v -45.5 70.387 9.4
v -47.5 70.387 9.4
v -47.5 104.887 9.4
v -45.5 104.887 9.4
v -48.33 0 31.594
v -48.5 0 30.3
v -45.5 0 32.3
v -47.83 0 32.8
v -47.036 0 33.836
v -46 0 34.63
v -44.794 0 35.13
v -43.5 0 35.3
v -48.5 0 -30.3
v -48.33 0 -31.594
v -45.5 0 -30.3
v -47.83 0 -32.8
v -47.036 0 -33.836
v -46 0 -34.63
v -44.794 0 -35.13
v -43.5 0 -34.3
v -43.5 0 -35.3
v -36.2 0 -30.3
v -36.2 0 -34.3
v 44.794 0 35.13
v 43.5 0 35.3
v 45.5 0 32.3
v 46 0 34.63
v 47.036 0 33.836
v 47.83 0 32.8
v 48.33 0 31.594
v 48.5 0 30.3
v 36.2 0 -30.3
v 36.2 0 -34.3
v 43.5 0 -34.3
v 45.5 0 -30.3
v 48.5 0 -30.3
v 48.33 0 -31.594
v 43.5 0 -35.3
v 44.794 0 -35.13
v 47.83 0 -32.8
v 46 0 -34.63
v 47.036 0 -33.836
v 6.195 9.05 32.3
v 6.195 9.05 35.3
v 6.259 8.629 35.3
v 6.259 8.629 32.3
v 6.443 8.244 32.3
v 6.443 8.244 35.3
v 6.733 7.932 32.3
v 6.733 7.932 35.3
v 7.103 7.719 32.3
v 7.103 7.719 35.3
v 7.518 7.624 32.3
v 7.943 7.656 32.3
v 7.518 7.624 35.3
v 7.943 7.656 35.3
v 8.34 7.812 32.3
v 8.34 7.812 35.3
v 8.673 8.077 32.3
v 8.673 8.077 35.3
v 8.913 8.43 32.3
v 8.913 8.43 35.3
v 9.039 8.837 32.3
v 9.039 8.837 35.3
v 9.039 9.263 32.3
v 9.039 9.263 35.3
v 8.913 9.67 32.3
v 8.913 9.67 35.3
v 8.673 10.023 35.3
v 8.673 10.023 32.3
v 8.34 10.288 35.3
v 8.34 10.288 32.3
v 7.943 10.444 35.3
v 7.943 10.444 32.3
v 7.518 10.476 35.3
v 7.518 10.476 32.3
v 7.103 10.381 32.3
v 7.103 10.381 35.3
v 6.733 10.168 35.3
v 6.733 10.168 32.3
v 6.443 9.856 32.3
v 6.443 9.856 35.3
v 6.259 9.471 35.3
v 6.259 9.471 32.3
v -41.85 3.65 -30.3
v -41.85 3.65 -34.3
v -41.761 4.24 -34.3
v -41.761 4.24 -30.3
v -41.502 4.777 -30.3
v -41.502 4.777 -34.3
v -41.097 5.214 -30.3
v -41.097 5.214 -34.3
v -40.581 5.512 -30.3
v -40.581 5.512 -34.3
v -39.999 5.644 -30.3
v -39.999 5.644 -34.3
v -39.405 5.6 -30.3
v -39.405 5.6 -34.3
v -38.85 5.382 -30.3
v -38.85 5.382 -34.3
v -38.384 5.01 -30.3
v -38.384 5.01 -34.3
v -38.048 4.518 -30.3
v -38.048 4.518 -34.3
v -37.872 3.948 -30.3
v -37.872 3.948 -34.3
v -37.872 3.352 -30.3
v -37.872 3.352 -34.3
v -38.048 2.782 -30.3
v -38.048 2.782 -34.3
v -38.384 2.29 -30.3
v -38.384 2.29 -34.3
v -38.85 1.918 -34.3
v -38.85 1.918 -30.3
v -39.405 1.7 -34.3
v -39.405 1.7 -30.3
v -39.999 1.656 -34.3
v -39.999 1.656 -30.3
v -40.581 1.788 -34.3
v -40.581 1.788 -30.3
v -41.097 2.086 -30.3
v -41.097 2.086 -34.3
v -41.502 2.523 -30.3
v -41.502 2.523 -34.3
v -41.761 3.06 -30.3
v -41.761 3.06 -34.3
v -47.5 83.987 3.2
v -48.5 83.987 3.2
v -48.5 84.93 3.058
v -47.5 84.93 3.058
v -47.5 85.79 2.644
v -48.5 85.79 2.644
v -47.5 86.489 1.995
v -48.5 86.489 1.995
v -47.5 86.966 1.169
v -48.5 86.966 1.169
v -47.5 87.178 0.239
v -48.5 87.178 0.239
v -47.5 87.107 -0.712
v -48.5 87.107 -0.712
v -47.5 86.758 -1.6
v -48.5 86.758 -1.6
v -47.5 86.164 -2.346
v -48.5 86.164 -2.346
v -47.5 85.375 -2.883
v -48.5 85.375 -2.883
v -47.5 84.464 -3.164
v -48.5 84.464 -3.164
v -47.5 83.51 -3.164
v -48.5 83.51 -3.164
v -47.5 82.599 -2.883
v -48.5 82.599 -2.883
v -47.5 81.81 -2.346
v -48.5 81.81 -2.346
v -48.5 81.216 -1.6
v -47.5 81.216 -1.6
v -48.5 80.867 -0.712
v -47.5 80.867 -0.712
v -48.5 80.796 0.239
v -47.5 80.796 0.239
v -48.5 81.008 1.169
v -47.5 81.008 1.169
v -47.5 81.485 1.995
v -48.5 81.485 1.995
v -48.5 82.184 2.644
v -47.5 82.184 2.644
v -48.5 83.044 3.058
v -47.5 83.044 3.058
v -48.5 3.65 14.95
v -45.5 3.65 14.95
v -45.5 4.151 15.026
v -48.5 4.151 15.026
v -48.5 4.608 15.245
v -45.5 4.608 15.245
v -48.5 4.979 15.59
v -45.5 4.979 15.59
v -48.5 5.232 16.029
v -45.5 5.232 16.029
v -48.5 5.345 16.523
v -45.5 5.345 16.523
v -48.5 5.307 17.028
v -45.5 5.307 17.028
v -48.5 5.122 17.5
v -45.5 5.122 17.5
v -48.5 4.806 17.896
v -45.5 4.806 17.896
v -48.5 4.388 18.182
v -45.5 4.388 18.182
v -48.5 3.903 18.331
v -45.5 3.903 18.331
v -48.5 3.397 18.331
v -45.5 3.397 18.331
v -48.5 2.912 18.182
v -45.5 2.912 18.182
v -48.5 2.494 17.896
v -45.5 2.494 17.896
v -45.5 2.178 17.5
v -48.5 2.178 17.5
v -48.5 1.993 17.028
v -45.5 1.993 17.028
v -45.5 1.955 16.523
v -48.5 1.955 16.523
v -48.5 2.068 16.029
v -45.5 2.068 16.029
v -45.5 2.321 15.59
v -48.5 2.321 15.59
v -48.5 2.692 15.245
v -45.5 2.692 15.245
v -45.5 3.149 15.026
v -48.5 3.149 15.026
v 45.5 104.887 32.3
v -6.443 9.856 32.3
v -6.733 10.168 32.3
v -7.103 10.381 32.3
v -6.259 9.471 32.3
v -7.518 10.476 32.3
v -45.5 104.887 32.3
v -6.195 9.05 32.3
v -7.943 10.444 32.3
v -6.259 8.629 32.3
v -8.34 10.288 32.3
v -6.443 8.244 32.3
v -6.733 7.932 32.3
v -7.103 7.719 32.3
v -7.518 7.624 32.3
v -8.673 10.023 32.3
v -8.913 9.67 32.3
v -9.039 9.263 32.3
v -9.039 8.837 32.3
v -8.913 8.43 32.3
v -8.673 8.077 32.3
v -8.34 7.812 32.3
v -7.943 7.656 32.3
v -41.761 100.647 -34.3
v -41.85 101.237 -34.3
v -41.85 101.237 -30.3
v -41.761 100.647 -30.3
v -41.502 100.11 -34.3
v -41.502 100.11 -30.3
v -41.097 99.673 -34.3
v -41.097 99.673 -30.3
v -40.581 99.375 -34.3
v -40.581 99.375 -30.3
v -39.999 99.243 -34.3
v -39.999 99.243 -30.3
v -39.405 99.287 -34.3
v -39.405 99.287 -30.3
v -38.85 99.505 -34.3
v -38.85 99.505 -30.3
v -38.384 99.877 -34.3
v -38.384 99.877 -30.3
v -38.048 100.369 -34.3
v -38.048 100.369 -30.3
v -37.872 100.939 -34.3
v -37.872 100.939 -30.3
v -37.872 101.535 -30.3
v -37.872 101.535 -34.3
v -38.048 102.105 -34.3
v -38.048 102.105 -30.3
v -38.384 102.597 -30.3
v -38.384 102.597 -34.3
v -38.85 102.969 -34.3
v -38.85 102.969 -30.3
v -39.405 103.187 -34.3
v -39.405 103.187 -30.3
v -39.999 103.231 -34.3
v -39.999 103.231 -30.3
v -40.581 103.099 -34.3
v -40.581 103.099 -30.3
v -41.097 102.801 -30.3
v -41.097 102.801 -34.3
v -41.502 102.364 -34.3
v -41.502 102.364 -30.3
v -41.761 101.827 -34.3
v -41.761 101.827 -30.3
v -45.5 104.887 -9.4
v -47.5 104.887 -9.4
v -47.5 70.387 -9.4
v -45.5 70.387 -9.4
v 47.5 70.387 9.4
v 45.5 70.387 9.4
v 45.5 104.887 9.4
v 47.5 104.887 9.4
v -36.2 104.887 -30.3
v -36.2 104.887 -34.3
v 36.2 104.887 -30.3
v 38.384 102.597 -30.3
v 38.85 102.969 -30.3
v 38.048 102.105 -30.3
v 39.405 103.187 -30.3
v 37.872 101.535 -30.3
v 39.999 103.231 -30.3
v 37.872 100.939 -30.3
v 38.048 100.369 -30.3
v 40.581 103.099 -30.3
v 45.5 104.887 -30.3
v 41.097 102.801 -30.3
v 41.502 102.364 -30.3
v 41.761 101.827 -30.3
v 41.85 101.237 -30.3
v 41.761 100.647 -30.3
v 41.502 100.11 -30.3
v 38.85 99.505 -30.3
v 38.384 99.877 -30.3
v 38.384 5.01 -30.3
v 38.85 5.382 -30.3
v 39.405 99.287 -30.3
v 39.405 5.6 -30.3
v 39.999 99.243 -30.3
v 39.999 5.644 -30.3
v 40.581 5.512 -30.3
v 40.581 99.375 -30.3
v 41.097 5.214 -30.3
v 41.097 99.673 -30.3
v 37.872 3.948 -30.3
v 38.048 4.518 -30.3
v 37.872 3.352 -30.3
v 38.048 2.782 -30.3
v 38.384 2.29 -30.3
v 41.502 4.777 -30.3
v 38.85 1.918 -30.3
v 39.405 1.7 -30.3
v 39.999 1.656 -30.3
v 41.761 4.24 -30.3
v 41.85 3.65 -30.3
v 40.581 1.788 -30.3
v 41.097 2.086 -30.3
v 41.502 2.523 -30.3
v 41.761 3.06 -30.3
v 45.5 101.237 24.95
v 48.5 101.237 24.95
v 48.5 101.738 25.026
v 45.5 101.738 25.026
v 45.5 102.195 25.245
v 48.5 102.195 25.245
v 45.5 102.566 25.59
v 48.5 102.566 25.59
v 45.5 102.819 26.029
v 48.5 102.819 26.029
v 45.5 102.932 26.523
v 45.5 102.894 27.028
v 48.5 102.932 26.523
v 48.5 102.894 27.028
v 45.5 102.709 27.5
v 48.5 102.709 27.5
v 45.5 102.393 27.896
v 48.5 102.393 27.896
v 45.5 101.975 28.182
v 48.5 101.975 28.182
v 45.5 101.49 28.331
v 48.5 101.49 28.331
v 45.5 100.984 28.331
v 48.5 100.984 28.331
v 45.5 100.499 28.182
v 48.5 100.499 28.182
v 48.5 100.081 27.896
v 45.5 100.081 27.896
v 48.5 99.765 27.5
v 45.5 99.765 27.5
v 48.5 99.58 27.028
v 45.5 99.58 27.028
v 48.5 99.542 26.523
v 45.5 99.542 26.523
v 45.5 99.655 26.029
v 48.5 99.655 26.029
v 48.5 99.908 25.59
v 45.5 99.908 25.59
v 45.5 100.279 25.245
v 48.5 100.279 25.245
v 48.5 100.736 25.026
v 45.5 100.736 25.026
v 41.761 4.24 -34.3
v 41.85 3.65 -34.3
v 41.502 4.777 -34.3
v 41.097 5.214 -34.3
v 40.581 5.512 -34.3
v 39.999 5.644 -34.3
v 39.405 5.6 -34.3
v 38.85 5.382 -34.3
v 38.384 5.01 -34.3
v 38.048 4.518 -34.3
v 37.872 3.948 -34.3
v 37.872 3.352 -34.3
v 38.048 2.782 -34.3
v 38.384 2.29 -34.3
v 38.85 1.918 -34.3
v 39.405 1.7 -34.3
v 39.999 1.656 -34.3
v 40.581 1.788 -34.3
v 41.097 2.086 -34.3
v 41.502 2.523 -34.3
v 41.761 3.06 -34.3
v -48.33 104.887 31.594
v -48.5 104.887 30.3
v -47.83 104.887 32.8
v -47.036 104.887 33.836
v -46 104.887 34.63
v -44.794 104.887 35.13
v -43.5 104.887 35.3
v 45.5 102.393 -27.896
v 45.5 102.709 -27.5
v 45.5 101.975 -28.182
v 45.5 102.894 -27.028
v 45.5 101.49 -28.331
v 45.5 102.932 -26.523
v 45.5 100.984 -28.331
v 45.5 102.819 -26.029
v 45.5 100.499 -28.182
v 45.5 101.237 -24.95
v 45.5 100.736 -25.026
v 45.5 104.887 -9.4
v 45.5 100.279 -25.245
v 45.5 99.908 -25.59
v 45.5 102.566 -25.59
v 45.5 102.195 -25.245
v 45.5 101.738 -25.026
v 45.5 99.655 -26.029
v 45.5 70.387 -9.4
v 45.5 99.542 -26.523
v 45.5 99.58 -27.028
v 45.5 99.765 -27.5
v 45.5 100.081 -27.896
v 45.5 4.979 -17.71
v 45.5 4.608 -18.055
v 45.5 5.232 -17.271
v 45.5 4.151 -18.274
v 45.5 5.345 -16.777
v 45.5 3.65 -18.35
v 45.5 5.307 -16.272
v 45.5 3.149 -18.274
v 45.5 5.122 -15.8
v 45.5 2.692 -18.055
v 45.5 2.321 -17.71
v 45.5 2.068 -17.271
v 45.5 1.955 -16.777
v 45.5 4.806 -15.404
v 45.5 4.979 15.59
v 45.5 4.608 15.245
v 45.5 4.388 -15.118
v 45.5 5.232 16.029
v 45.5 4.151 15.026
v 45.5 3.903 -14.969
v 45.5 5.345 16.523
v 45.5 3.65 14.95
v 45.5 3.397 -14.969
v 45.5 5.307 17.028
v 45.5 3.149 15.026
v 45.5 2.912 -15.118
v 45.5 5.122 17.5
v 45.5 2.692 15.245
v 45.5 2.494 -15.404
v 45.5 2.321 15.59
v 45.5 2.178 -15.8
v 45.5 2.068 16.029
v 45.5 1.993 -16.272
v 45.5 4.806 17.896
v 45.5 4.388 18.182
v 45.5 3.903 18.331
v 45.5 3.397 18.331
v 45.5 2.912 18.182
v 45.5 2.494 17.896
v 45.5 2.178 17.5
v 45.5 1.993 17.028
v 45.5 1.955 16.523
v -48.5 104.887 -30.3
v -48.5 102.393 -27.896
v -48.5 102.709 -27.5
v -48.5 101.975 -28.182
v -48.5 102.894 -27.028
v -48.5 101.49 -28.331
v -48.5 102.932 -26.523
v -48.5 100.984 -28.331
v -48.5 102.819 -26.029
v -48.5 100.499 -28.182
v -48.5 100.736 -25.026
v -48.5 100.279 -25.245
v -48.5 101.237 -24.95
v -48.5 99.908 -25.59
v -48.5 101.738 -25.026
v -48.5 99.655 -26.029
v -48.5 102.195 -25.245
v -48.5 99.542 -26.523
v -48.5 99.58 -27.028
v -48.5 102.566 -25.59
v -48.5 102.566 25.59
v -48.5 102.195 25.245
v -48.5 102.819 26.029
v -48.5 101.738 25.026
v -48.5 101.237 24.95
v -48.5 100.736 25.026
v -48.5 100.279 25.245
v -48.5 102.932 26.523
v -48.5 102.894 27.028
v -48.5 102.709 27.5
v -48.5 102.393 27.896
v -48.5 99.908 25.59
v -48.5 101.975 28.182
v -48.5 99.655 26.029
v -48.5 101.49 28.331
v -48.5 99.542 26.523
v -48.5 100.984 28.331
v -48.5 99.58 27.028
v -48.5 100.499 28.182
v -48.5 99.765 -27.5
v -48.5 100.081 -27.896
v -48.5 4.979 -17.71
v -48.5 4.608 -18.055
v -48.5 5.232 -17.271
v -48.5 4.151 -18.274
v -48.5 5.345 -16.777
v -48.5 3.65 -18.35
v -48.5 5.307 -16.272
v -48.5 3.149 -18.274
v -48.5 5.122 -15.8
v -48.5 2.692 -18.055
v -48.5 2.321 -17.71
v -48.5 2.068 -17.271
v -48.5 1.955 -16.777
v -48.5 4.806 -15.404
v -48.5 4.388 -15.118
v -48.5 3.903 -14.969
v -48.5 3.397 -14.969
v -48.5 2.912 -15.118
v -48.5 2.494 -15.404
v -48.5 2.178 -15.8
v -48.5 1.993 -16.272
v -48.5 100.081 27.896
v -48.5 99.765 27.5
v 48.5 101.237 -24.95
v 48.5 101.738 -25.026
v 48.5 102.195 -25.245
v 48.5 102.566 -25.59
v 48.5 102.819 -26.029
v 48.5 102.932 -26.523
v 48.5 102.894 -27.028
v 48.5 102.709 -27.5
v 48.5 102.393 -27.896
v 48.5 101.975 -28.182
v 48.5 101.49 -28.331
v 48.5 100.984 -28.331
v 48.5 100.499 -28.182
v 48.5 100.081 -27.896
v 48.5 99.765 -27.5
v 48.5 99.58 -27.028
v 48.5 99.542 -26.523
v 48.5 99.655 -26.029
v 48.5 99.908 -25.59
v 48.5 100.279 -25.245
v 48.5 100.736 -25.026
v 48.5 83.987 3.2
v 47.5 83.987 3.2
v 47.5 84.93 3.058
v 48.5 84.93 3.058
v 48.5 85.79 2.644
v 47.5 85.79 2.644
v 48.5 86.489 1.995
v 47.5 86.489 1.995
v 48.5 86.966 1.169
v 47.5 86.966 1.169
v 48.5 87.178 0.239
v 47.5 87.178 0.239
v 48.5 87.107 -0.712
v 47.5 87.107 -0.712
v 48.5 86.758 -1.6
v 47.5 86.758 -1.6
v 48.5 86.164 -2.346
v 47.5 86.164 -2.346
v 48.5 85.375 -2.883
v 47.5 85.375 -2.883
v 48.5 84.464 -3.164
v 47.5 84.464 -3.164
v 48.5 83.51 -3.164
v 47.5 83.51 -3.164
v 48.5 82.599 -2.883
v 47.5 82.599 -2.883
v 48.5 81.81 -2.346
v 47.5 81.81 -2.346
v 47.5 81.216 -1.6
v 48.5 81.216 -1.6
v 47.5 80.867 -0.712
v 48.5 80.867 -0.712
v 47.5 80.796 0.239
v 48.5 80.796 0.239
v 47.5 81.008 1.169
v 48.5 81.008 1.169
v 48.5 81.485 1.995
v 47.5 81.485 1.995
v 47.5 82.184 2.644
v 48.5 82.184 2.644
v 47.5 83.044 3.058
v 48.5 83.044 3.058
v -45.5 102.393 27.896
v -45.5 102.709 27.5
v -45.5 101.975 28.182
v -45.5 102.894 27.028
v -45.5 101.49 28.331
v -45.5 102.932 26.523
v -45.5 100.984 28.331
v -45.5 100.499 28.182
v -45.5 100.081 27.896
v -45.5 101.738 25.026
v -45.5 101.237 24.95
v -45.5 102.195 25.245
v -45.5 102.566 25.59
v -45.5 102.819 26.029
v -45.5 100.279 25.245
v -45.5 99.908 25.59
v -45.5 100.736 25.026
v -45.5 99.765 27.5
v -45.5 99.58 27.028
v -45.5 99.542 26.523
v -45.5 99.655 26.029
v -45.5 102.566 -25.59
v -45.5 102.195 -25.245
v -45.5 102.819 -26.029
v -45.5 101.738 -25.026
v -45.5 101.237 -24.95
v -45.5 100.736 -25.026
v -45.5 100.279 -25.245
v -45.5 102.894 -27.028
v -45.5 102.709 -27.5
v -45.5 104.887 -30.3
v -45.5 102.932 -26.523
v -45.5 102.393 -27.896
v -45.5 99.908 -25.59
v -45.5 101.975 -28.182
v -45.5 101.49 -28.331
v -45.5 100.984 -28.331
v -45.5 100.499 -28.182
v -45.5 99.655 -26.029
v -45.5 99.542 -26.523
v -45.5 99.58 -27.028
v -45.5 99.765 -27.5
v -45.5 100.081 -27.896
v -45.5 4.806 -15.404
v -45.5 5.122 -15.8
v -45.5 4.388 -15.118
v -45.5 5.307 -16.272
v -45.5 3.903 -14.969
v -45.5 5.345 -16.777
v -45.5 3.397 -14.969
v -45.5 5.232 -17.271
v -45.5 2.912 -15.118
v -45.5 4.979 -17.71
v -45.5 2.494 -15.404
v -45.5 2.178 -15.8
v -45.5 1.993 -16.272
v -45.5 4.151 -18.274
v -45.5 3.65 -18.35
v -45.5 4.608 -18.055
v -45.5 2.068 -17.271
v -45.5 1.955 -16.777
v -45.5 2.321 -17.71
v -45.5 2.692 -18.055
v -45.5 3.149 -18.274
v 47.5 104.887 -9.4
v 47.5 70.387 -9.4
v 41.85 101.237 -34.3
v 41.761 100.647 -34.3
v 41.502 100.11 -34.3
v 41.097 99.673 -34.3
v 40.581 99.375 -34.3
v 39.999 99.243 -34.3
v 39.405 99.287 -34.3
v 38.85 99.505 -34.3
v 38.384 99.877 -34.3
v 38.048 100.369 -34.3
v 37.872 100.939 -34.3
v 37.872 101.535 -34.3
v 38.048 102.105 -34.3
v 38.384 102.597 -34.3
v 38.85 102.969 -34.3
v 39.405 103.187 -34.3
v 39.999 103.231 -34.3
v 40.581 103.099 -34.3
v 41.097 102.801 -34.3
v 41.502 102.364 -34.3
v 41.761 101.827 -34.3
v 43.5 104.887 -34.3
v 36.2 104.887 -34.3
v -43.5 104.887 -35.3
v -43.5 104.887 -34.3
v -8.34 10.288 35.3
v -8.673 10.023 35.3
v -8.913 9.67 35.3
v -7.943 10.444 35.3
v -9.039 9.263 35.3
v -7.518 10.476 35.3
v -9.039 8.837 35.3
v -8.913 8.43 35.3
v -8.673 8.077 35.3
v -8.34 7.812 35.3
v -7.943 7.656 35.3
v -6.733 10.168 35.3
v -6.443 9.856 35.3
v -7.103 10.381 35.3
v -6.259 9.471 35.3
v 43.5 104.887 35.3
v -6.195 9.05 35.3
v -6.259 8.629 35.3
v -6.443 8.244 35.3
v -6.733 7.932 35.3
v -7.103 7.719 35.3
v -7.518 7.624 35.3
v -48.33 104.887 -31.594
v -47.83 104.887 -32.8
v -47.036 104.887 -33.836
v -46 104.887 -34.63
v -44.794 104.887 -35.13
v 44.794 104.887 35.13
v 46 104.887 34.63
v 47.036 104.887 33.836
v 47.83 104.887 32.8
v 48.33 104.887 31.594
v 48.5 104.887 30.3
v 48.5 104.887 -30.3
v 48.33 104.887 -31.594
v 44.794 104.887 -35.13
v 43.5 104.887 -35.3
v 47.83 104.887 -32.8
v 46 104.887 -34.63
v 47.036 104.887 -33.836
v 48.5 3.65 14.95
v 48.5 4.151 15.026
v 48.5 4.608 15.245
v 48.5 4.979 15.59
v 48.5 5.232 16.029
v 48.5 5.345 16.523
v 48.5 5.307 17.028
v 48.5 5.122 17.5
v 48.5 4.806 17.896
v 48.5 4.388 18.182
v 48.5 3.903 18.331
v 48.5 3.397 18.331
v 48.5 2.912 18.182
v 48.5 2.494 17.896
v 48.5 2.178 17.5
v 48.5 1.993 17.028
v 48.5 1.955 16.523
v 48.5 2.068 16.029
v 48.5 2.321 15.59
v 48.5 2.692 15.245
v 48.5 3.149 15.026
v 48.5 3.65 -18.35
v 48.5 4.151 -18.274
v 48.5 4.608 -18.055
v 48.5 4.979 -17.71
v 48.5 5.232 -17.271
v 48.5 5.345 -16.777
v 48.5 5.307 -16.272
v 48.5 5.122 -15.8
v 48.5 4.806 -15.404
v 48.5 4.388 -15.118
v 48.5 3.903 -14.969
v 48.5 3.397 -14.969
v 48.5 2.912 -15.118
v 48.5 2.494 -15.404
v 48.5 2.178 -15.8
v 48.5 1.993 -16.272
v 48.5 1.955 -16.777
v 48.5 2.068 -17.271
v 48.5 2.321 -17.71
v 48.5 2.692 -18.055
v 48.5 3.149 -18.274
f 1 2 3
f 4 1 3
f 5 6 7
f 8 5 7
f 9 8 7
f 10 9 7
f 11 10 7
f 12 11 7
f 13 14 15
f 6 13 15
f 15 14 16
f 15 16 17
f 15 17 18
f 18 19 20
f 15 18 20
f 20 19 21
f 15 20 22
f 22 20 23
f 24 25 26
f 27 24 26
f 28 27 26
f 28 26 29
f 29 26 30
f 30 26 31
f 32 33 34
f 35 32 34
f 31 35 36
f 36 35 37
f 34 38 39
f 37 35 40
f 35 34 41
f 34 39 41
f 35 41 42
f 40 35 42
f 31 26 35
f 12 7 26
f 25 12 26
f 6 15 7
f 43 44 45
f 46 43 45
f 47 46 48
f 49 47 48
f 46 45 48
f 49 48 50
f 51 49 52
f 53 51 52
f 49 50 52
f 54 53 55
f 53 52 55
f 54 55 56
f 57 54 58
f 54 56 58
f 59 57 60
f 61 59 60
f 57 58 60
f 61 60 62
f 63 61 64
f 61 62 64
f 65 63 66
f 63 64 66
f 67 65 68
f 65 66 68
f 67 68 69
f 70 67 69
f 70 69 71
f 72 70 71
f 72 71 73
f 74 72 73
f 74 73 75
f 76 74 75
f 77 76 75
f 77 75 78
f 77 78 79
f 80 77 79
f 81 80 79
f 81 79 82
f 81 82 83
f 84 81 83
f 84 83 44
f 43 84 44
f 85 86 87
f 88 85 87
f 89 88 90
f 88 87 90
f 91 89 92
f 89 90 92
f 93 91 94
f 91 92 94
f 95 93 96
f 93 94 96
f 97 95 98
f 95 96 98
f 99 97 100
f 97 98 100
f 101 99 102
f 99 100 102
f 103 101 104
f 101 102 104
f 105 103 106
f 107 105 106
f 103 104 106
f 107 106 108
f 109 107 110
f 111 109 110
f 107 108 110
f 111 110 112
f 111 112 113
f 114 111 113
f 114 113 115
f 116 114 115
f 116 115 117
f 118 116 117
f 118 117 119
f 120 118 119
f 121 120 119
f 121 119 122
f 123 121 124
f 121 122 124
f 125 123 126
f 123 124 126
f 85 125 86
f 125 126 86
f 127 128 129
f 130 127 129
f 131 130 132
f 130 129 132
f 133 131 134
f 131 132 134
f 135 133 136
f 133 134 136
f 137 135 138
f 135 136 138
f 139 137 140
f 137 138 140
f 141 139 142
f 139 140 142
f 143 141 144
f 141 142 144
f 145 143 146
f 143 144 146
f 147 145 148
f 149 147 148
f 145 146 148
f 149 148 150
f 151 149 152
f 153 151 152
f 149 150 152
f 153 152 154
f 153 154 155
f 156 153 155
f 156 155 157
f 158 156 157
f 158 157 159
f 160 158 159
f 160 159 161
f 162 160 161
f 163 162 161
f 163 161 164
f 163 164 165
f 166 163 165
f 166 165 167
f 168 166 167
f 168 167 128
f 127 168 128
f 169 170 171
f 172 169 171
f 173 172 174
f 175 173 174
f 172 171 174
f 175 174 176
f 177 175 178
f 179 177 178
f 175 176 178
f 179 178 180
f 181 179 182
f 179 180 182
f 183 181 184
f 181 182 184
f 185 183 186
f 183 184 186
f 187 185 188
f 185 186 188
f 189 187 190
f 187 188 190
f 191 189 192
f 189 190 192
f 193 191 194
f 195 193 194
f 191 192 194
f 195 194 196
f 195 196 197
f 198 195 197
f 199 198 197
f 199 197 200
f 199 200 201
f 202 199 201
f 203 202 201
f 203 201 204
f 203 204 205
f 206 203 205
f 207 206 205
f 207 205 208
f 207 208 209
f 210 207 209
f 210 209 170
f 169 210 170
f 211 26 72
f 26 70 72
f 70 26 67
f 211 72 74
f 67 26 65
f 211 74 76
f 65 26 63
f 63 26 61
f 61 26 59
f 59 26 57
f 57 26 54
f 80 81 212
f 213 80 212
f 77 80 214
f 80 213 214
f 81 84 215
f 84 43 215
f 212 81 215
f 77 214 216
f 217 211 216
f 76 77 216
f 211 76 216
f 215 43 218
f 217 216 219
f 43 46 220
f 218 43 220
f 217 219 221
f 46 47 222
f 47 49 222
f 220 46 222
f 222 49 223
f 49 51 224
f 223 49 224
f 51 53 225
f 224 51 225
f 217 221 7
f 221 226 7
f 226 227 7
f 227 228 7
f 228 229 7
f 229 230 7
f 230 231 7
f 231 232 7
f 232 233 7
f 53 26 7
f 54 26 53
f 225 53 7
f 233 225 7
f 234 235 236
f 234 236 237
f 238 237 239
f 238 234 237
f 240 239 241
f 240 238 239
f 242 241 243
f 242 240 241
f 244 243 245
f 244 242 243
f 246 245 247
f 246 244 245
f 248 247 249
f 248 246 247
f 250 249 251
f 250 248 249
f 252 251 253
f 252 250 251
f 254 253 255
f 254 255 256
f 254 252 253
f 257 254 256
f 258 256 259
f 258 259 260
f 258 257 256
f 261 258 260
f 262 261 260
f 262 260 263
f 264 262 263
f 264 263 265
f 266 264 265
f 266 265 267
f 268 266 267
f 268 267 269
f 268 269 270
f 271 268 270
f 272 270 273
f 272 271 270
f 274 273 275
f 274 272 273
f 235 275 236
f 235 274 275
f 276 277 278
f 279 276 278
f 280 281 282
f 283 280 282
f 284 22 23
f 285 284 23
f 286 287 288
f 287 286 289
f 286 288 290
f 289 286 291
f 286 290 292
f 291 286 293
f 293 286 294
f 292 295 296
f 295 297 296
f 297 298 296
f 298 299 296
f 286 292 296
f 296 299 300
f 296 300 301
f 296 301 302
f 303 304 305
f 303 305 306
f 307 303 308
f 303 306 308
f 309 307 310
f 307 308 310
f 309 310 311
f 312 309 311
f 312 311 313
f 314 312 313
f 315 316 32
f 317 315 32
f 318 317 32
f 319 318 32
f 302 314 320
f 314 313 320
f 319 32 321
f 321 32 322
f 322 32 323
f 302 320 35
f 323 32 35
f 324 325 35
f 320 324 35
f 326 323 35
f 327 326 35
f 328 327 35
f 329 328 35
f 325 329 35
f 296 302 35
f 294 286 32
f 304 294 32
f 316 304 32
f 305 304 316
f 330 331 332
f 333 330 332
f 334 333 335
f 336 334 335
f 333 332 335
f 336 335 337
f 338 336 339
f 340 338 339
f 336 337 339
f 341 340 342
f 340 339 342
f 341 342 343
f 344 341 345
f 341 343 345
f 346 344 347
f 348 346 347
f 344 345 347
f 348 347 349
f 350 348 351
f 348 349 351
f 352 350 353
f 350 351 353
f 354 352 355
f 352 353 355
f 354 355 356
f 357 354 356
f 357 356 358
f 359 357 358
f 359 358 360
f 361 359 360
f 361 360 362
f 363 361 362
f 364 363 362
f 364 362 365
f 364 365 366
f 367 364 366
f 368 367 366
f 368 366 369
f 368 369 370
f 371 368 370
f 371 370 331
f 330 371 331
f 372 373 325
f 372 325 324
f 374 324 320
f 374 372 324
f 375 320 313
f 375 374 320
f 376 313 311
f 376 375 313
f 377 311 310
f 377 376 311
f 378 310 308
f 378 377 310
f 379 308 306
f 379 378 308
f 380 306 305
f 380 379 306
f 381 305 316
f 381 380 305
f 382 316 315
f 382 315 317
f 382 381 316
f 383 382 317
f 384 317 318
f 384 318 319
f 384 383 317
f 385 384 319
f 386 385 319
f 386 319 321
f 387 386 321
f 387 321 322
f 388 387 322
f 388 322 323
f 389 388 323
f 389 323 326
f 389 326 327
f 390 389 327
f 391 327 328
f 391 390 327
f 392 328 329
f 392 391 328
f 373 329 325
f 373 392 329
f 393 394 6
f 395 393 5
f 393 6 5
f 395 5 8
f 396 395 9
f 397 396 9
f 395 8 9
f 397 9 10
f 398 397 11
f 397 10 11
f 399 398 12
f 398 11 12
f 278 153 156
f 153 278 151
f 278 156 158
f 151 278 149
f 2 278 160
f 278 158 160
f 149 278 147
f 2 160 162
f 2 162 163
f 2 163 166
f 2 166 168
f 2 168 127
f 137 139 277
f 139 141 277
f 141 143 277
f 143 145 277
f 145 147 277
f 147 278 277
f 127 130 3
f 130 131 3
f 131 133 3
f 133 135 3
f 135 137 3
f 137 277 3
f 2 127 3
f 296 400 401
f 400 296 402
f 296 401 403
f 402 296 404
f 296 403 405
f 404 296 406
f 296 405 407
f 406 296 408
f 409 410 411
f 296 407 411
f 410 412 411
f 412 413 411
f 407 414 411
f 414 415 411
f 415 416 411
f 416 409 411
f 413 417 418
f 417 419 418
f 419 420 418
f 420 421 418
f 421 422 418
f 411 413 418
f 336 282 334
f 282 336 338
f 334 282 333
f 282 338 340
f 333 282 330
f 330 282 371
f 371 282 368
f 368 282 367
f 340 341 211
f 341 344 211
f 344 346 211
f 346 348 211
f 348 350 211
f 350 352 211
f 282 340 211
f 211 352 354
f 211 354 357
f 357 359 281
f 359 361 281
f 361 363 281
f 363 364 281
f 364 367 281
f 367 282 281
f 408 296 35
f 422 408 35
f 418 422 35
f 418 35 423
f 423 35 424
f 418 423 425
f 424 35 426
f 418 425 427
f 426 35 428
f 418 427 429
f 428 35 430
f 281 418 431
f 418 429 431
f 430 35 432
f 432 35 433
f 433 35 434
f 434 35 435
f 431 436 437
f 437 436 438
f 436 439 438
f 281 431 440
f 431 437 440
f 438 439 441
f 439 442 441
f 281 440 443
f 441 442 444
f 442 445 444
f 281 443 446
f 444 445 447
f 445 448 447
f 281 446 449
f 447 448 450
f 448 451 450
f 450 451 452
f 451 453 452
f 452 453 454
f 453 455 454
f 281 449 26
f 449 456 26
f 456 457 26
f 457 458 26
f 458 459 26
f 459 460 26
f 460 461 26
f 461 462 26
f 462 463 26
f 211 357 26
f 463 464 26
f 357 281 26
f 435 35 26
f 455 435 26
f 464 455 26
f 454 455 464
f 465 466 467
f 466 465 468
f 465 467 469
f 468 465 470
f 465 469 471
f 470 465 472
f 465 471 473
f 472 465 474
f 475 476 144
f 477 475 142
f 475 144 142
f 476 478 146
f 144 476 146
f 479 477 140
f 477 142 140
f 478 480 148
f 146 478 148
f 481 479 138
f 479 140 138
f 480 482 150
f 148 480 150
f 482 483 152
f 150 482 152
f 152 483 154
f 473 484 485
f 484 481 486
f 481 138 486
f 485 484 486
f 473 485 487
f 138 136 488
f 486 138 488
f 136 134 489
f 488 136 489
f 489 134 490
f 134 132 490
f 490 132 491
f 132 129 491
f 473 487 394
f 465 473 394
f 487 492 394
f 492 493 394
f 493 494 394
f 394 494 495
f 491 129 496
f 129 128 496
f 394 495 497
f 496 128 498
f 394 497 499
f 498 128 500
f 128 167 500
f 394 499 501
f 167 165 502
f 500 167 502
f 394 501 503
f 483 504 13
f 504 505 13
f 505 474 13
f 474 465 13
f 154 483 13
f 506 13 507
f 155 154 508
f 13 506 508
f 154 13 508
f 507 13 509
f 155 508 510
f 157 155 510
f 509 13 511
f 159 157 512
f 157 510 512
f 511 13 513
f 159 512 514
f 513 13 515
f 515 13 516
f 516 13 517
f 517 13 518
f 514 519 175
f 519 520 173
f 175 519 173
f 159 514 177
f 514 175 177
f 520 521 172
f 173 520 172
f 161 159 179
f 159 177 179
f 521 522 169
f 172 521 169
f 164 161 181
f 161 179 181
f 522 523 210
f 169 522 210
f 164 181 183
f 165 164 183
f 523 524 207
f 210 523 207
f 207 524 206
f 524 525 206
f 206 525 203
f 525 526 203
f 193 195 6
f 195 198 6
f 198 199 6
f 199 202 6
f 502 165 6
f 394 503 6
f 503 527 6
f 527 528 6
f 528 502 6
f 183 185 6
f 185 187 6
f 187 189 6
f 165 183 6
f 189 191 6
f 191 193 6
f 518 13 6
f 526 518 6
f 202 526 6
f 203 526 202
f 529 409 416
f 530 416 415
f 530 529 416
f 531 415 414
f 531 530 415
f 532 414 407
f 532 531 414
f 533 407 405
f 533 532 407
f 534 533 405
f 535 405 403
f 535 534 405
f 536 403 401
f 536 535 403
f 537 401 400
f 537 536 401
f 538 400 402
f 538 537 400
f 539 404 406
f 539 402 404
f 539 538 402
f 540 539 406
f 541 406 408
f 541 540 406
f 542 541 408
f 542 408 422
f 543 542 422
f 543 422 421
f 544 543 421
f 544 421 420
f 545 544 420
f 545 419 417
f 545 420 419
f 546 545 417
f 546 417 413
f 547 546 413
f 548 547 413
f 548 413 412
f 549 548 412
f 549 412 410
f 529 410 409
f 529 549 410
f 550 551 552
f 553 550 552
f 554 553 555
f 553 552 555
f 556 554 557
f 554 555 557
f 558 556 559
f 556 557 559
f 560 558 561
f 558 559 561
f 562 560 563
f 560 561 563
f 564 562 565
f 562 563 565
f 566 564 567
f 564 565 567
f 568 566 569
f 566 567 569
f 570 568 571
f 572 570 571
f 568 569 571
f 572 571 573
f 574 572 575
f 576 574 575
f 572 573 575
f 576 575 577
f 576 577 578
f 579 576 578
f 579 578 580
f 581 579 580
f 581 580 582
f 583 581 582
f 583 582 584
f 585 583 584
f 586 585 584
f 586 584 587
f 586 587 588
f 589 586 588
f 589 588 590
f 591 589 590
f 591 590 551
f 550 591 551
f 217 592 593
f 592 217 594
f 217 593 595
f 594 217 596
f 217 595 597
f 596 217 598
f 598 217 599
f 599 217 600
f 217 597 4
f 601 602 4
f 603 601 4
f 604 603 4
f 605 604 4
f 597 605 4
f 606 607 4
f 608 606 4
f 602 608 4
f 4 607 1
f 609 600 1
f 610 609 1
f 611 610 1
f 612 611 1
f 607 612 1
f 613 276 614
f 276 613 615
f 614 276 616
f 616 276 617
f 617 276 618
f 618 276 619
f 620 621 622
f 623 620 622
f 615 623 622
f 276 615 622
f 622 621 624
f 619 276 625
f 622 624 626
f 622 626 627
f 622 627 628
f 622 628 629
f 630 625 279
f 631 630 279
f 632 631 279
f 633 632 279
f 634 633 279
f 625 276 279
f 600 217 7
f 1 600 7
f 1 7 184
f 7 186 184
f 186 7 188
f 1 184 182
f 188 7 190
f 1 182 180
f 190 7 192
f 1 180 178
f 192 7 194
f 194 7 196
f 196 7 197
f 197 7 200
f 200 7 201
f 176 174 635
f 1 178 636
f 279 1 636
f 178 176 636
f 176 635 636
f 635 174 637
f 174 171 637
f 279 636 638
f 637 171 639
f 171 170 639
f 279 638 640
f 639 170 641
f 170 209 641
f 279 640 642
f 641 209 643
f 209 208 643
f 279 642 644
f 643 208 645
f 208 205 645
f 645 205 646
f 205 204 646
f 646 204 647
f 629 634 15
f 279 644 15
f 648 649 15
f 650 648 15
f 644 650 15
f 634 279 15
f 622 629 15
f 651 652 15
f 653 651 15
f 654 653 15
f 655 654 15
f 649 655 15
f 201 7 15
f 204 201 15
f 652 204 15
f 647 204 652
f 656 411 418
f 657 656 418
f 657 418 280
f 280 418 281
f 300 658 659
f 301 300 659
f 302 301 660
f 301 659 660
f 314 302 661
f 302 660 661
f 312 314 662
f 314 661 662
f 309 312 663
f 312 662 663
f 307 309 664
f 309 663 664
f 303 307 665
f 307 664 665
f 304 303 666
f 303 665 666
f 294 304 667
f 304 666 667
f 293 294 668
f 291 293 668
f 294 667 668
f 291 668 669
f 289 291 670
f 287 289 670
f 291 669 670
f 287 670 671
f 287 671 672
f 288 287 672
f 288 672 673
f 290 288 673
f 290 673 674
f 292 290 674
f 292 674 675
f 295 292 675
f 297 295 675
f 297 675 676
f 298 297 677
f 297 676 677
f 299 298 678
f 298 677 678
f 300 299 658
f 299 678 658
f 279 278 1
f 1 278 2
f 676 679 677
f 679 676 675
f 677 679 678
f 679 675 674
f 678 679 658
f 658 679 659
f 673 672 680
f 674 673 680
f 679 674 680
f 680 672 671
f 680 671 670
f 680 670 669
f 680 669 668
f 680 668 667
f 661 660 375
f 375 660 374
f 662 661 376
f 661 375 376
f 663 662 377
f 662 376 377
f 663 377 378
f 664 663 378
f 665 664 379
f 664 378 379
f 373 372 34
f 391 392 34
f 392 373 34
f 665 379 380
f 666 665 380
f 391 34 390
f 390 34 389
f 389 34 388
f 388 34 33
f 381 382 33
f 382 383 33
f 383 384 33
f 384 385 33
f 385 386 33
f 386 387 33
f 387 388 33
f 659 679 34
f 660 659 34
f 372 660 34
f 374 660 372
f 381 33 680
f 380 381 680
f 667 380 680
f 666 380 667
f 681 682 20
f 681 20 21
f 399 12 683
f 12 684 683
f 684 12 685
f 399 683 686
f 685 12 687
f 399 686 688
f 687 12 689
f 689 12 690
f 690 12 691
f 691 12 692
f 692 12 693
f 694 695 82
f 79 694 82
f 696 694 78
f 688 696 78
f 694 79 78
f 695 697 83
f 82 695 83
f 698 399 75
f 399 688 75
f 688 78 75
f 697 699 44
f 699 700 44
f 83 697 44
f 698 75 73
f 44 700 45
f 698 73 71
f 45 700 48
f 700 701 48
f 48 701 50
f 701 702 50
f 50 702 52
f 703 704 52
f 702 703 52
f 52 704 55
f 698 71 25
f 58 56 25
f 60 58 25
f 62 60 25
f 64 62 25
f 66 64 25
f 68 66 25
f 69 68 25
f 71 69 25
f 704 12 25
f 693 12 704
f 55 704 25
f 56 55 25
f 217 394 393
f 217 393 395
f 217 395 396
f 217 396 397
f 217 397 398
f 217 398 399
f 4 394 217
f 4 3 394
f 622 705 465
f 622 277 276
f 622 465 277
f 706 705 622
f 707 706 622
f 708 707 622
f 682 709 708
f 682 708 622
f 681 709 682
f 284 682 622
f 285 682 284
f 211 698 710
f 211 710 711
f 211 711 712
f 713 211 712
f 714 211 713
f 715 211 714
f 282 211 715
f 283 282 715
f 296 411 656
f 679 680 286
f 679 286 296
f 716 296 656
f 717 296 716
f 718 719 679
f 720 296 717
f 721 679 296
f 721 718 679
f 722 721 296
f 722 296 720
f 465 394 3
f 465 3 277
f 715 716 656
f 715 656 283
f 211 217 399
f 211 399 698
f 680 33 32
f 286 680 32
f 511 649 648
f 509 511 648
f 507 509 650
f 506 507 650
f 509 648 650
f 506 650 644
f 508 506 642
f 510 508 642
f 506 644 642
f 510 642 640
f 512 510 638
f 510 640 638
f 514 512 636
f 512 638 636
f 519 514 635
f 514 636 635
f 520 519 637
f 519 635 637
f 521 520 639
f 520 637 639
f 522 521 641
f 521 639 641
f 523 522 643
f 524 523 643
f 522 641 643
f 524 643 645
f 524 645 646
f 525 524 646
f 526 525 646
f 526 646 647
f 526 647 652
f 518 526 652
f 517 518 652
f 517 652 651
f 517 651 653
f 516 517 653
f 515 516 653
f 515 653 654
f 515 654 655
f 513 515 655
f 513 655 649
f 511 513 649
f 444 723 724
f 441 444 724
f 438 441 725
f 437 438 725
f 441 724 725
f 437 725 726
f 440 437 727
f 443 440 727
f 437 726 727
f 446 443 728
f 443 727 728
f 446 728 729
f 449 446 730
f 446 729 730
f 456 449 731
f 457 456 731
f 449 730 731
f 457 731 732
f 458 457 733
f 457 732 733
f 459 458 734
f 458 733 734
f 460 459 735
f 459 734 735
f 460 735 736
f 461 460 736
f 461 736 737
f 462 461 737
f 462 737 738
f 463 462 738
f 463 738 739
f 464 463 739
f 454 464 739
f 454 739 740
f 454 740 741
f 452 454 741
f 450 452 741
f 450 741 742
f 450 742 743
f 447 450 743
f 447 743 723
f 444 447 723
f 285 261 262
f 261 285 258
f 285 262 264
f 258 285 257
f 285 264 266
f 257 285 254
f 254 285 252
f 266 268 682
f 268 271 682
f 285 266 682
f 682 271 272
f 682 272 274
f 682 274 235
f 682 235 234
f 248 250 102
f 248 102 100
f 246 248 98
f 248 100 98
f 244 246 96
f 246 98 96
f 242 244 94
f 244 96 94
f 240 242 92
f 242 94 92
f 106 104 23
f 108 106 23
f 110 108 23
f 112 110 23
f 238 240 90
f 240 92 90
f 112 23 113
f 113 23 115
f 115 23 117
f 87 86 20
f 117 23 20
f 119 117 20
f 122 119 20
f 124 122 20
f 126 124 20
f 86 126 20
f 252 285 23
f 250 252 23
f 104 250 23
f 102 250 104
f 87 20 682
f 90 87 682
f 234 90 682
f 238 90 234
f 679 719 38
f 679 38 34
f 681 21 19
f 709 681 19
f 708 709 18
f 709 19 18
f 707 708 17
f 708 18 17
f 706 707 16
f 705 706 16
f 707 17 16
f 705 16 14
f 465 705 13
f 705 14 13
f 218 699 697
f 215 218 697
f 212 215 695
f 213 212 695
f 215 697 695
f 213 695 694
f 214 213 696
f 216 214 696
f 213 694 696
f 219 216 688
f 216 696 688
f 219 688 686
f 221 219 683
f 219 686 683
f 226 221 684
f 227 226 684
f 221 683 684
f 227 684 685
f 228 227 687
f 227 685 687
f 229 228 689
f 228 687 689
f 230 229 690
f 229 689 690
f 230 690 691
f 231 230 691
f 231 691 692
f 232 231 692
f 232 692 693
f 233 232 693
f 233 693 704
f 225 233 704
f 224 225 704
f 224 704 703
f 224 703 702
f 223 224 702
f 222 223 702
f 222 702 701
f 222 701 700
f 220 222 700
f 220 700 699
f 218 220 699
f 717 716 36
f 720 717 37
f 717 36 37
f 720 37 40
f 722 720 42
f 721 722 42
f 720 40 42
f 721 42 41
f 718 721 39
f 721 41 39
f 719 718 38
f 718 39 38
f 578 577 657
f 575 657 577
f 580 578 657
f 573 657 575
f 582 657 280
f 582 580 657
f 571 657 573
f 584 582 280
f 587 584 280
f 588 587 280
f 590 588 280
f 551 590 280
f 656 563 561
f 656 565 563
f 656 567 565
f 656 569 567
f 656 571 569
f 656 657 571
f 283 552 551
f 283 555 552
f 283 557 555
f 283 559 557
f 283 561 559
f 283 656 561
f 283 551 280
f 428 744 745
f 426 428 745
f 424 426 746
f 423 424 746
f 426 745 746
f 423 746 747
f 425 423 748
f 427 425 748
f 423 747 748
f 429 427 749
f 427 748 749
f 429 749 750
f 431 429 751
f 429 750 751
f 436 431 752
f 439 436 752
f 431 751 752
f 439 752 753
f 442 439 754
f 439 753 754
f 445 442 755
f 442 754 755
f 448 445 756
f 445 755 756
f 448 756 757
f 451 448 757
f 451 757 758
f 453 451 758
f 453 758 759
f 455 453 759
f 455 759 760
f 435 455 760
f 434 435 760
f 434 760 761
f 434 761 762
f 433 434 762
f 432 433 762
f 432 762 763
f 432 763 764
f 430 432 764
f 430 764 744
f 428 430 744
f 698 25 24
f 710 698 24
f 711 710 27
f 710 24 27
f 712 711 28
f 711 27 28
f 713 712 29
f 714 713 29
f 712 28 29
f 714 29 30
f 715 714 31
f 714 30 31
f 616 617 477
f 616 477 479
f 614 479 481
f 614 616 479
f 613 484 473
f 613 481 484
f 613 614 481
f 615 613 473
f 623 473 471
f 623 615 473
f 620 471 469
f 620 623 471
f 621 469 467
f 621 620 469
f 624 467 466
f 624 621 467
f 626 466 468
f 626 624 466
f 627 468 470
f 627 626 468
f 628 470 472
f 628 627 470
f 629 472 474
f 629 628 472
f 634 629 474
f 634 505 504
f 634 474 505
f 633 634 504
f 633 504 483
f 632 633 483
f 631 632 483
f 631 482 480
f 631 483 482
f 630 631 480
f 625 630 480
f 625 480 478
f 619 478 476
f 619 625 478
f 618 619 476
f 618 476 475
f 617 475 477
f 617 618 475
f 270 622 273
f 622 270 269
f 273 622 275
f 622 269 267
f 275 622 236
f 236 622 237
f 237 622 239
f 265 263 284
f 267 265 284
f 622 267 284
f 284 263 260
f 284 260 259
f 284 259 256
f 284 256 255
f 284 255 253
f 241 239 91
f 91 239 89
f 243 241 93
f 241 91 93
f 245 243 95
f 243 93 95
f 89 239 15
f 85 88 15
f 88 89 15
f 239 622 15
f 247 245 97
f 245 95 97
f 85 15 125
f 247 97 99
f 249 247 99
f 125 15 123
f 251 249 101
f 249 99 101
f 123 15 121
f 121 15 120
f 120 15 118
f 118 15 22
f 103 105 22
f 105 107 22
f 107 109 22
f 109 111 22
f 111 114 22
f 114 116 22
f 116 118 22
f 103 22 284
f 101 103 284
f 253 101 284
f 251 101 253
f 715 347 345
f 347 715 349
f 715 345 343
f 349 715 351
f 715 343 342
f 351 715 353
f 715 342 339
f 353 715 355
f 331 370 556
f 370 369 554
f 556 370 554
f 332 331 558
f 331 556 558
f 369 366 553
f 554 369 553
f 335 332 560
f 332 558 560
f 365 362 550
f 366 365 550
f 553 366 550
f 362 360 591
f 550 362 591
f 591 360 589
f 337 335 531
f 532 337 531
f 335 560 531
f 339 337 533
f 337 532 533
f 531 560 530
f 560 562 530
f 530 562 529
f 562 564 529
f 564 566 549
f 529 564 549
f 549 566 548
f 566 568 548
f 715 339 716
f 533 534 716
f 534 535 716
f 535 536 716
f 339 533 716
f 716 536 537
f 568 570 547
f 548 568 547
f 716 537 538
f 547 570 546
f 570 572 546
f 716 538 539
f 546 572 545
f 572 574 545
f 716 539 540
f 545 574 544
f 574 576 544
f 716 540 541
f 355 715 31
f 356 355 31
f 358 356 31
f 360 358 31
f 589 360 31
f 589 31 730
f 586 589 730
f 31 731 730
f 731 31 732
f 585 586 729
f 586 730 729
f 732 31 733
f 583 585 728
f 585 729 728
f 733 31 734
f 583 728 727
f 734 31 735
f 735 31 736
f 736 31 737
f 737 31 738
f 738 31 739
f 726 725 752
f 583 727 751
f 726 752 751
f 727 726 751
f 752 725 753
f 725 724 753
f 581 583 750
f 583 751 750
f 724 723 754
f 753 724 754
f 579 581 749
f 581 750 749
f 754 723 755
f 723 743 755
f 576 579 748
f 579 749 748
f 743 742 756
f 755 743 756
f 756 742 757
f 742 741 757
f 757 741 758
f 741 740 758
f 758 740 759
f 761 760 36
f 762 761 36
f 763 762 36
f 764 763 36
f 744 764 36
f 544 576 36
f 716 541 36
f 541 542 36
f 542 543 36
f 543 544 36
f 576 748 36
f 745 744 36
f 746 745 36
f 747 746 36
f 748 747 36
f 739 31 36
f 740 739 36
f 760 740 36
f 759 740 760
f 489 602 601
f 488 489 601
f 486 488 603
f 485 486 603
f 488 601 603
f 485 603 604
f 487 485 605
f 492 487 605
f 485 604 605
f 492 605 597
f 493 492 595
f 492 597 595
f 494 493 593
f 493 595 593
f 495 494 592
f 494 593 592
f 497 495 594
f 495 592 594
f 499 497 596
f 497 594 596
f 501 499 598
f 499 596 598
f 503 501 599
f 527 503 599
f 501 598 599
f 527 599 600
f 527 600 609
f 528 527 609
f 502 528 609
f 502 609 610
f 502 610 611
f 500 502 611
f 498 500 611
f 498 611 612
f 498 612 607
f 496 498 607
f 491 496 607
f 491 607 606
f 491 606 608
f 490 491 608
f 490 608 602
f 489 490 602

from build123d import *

# Parameters (mm, degrees)
BOSS_EXTRUDE1_DEPTH     = 104.887
SKETCH2_R               = 1.7
CUT_EXTRUDE1_DEPTH      = 148.161043653
SKETCH6_R               = 1.7
CUT_EXTRUDE9_DEPTH      = 148.161043653
SKETCH3_9_R             = 3.2
CUT_EXTRUDE4_DEPTH      = 148.161043653
SKETCH4_R               = 2
CUT_EXTRUDE5_DEPTH      = 4
SKETCH5_R               = 1.43
CUT_EXTRUDE6_DEPTH      = 136.417475863
MIRROR9_COPY_1_SKETCH_R = 2
MIRROR9_COPY_1_DEPTH    = 4
CUT_EXTRUDE7_START      = -1
SKETCH3_10_W            = 10.4
SKETCH3_10_H            = 14.6
SKETCH3_10_H_2          = 12.6
SKETCH3_10_R            = 3.2
SKETCH3_10_R_2          = 1
CUT_EXTRUDE7_DEPTH      = 2
CUT_EXTRUDE8_START      = -94
SKETCH3_W               = 10.4
SKETCH3_H               = 14.6
SKETCH3_H_2             = 12.6
SKETCH3_R               = 3.2
SKETCH3_R_2             = 1
CUT_EXTRUDE8_DEPTH      = 2


with BuildPart() as part:
    # Sketch1 → Boss-Extrude1 (new body)
    with BuildSketch(Plane(origin=(0, 0, 0), x_dir=(1, 0, 0), z_dir=(0, 1, 0))):
        with BuildLine():
            ThreePointArc((-48.5, -30.3), (-47.035533906, -33.835533906), (-43.5, -35.3))
            Line((-43.5, -35.3), (43.5, -35.3))
            ThreePointArc((43.5, -35.3), (47.035533906, -33.835533906), (48.5, -30.3))
            Line((48.5, -30.3), (48.5, 30.3))
            ThreePointArc((48.5, 30.3), (47.035533906, 33.835533906), (43.5, 35.3))
            Line((43.5, 35.3), (43.5, 34.3))
            Line((43.5, 34.3), (36.2, 34.3))
            Line((36.2, 34.3), (36.2, 30.3))
            Line((36.2, 30.3), (45.5, 30.3))
            Line((45.5, 30.3), (45.5, -32.3))
            Line((45.5, -32.3), (-45.5, -32.3))
            Line((-45.5, -32.3), (-45.5, 30.3))
            Line((-45.5, 30.3), (-36.2, 30.3))
            Line((-36.2, 30.3), (-36.2, 34.3))
            Line((-36.2, 34.3), (-43.5, 34.3))
            Line((-43.5, 34.3), (-43.5, 35.3))
            ThreePointArc((-43.5, 35.3), (-47.035533906, 33.835533906), (-48.5, 30.3))
            Line((-48.5, 30.3), (-48.5, -30.3))
        make_face()
    extrude(amount=BOSS_EXTRUDE1_DEPTH)

    # Sketch2 → Cut-Extrude1 (cut, through all)
    with BuildSketch(Plane(origin=(48.5, 0, 0), x_dir=(0, 0, -1), z_dir=(1, 0, 0))):
        with Locations((16.65, 3.65)):
            Circle(SKETCH2_R)
        with Locations((-16.65, 3.65)):
            Circle(SKETCH2_R)
    extrude(amount=-CUT_EXTRUDE1_DEPTH, mode=Mode.SUBTRACT)

    # Sketch6 → Cut-Extrude9 (cut, through all)
    with BuildSketch(Plane(origin=(48.5, 0, 0), x_dir=(0, 0, -1), z_dir=(1, 0, 0))):
        with Locations((-26.65, 101.237)):
            Circle(SKETCH6_R)
    cut_extrude9 = extrude(amount=-CUT_EXTRUDE9_DEPTH, mode=Mode.SUBTRACT)

    # Mirror11: Cut-Extrude9 across plane
    add(cut_extrude9.mirror(Plane.XY), mode=Mode.SUBTRACT)

    # Sketch3<9> → Cut-Extrude4 (cut, through all)
    with BuildSketch(Plane.ZY.offset(48.5)):
        with Locations((0, 83.987)):
            Circle(SKETCH3_9_R)
    extrude(amount=-CUT_EXTRUDE4_DEPTH, mode=Mode.SUBTRACT)

    # Sketch4 → Cut-Extrude5 (cut)
    with BuildSketch(Plane(origin=(0, 0, -34.3), x_dir=(-1, 0, 0), z_dir=(0, 0, -1))):
        with Locations((39.85, 3.65)):
            Circle(SKETCH4_R)
    cut_extrude5 = extrude(amount=-CUT_EXTRUDE5_DEPTH, mode=Mode.SUBTRACT)

    # Mirror7: Cut-Extrude5 across plane
    add(cut_extrude5.mirror(Plane(origin=(0, 0, 0), x_dir=(0, 0, 1), z_dir=(1, 0, 0))), mode=Mode.SUBTRACT)

    # Sketch5 → Cut-Extrude6 (cut, through all)
    with BuildSketch(Plane.XY.offset(35.3)):
        with Locations((-7.625, 9.05)):
            Circle(SKETCH5_R)
        with Locations(Location((7.625, 9.05, 0), (0, 0, 180))):
            Circle(SKETCH5_R)
    extrude(amount=-CUT_EXTRUDE6_DEPTH, mode=Mode.SUBTRACT)

    # Mirror9: Cut-Extrude5 across plane
    add(cut_extrude5.mirror(Plane.ZX.offset(52.4435)), mode=Mode.SUBTRACT)

    # Mirror9 copy 1 sketch → Mirror9 copy 1 (cut)
    with BuildSketch(Plane(origin=(0, 104.887, -34.3), x_dir=(1, 0, 0), z_dir=(0, 0, -1))):
        with Locations((39.85, 3.65)):
            Circle(MIRROR9_COPY_1_SKETCH_R)
    extrude(amount=-MIRROR9_COPY_1_DEPTH, mode=Mode.SUBTRACT)

    # Sketch3<10> → Cut-Extrude7 (cut)
    # profile 1 of 8: a face of its own
    with BuildSketch(Plane.ZY.offset(48.5).offset(CUT_EXTRUDE7_START)):
        Polygon((-5.2, 77.687), (-5.2, 90.287), (-5.2, 104.887), (-9.4, 104.887), (-9.4, 77.687), align=None)
    # profile 2 of 8: a face of its own
    with BuildSketch(Plane.ZY.offset(48.5).offset(CUT_EXTRUDE7_START)):
        Polygon((5.2, 104.887), (5.2, 90.287), (5.2, 77.687), (9.4, 77.687), (9.4, 104.887), align=None)
    # profile 3 of 8: a face of its own
    with BuildSketch(Plane.ZY.offset(48.5).offset(CUT_EXTRUDE7_START)):
        with Locations((0, 97.587)):
            Rectangle(SKETCH3_10_W, SKETCH3_10_H)
    # profile 4 of 8: a face of its own
    with BuildSketch(Plane.ZY.offset(48.5).offset(CUT_EXTRUDE7_START)):
        Polygon((-9.4, 70.387), (9.4, 70.387), (9.4, 77.687), (5.2, 77.687), (-5.2, 77.687), (-9.4, 77.687), align=None)
    # profile 5 of 8: a face of its own
    with BuildSketch(Plane.ZY.offset(48.5).offset(CUT_EXTRUDE7_START)):
        with Locations((0, 83.987)):
            Rectangle(SKETCH3_10_W, SKETCH3_10_H_2)
        with Locations((0, 83.987)):
            Circle(SKETCH3_10_R, mode=Mode.SUBTRACT)
        with Locations((0, 79.487)):
            Circle(SKETCH3_10_R_2, mode=Mode.SUBTRACT)
        with Locations((0, 88.487)):
            Circle(SKETCH3_10_R_2, mode=Mode.SUBTRACT)
    # profile 6 of 8: a face of its own
    with BuildSketch(Plane.ZY.offset(48.5).offset(CUT_EXTRUDE7_START)):
        with Locations((0, 79.487)):
            Circle(SKETCH3_10_R_2)
    # profile 7 of 8: a face of its own
    with BuildSketch(Plane.ZY.offset(48.5).offset(CUT_EXTRUDE7_START)):
        with Locations((0, 83.987)):
            Circle(SKETCH3_10_R)
    # profile 8 of 8: a face of its own
    with BuildSketch(Plane.ZY.offset(48.5).offset(CUT_EXTRUDE7_START)):
        with Locations((0, 88.487)):
            Circle(SKETCH3_10_R_2)
    extrude(amount=-CUT_EXTRUDE7_DEPTH, mode=Mode.SUBTRACT)

    # Sketch3 → Cut-Extrude8 (cut)
    # profile 1 of 8: a face of its own
    with BuildSketch(Plane.ZY.offset(48.5).offset(CUT_EXTRUDE8_START)):
        Polygon((-5.2, 77.687), (-5.2, 90.287), (-5.2, 104.887), (-9.4, 104.887), (-9.4, 77.687), align=None)
    # profile 2 of 8: a face of its own
    with BuildSketch(Plane.ZY.offset(48.5).offset(CUT_EXTRUDE8_START)):
        Polygon((5.2, 104.887), (5.2, 90.287), (5.2, 77.687), (9.4, 77.687), (9.4, 104.887), align=None)
    # profile 3 of 8: a face of its own
    with BuildSketch(Plane.ZY.offset(48.5).offset(CUT_EXTRUDE8_START)):
        with Locations((0, 97.587)):
            Rectangle(SKETCH3_W, SKETCH3_H)
    # profile 4 of 8: a face of its own
    with BuildSketch(Plane.ZY.offset(48.5).offset(CUT_EXTRUDE8_START)):
        with Locations((0, 83.987)):
            Rectangle(SKETCH3_W, SKETCH3_H_2)
        with Locations((0, 83.987)):
            Circle(SKETCH3_R, mode=Mode.SUBTRACT)
        with Locations((0, 79.487)):
            Circle(SKETCH3_R_2, mode=Mode.SUBTRACT)
        with Locations((0, 88.487)):
            Circle(SKETCH3_R_2, mode=Mode.SUBTRACT)
    # profile 5 of 8: a face of its own
    with BuildSketch(Plane.ZY.offset(48.5).offset(CUT_EXTRUDE8_START)):
        with Locations((0, 88.487)):
            Circle(SKETCH3_R_2)
    # profile 6 of 8: a face of its own
    with BuildSketch(Plane.ZY.offset(48.5).offset(CUT_EXTRUDE8_START)):
        with Locations((0, 83.987)):
            Circle(SKETCH3_R)
    # profile 7 of 8: a face of its own
    with BuildSketch(Plane.ZY.offset(48.5).offset(CUT_EXTRUDE8_START)):
        with Locations((0, 79.487)):
            Circle(SKETCH3_R_2)
    # profile 8 of 8: a face of its own
    with BuildSketch(Plane.ZY.offset(48.5).offset(CUT_EXTRUDE8_START)):
        Polygon((-9.4, 70.387), (9.4, 70.387), (9.4, 77.687), (5.2, 77.687), (-5.2, 77.687), (-9.4, 77.687), align=None)
    extrude(amount=-CUT_EXTRUDE8_DEPTH, mode=Mode.SUBTRACT)


solid = part.part
